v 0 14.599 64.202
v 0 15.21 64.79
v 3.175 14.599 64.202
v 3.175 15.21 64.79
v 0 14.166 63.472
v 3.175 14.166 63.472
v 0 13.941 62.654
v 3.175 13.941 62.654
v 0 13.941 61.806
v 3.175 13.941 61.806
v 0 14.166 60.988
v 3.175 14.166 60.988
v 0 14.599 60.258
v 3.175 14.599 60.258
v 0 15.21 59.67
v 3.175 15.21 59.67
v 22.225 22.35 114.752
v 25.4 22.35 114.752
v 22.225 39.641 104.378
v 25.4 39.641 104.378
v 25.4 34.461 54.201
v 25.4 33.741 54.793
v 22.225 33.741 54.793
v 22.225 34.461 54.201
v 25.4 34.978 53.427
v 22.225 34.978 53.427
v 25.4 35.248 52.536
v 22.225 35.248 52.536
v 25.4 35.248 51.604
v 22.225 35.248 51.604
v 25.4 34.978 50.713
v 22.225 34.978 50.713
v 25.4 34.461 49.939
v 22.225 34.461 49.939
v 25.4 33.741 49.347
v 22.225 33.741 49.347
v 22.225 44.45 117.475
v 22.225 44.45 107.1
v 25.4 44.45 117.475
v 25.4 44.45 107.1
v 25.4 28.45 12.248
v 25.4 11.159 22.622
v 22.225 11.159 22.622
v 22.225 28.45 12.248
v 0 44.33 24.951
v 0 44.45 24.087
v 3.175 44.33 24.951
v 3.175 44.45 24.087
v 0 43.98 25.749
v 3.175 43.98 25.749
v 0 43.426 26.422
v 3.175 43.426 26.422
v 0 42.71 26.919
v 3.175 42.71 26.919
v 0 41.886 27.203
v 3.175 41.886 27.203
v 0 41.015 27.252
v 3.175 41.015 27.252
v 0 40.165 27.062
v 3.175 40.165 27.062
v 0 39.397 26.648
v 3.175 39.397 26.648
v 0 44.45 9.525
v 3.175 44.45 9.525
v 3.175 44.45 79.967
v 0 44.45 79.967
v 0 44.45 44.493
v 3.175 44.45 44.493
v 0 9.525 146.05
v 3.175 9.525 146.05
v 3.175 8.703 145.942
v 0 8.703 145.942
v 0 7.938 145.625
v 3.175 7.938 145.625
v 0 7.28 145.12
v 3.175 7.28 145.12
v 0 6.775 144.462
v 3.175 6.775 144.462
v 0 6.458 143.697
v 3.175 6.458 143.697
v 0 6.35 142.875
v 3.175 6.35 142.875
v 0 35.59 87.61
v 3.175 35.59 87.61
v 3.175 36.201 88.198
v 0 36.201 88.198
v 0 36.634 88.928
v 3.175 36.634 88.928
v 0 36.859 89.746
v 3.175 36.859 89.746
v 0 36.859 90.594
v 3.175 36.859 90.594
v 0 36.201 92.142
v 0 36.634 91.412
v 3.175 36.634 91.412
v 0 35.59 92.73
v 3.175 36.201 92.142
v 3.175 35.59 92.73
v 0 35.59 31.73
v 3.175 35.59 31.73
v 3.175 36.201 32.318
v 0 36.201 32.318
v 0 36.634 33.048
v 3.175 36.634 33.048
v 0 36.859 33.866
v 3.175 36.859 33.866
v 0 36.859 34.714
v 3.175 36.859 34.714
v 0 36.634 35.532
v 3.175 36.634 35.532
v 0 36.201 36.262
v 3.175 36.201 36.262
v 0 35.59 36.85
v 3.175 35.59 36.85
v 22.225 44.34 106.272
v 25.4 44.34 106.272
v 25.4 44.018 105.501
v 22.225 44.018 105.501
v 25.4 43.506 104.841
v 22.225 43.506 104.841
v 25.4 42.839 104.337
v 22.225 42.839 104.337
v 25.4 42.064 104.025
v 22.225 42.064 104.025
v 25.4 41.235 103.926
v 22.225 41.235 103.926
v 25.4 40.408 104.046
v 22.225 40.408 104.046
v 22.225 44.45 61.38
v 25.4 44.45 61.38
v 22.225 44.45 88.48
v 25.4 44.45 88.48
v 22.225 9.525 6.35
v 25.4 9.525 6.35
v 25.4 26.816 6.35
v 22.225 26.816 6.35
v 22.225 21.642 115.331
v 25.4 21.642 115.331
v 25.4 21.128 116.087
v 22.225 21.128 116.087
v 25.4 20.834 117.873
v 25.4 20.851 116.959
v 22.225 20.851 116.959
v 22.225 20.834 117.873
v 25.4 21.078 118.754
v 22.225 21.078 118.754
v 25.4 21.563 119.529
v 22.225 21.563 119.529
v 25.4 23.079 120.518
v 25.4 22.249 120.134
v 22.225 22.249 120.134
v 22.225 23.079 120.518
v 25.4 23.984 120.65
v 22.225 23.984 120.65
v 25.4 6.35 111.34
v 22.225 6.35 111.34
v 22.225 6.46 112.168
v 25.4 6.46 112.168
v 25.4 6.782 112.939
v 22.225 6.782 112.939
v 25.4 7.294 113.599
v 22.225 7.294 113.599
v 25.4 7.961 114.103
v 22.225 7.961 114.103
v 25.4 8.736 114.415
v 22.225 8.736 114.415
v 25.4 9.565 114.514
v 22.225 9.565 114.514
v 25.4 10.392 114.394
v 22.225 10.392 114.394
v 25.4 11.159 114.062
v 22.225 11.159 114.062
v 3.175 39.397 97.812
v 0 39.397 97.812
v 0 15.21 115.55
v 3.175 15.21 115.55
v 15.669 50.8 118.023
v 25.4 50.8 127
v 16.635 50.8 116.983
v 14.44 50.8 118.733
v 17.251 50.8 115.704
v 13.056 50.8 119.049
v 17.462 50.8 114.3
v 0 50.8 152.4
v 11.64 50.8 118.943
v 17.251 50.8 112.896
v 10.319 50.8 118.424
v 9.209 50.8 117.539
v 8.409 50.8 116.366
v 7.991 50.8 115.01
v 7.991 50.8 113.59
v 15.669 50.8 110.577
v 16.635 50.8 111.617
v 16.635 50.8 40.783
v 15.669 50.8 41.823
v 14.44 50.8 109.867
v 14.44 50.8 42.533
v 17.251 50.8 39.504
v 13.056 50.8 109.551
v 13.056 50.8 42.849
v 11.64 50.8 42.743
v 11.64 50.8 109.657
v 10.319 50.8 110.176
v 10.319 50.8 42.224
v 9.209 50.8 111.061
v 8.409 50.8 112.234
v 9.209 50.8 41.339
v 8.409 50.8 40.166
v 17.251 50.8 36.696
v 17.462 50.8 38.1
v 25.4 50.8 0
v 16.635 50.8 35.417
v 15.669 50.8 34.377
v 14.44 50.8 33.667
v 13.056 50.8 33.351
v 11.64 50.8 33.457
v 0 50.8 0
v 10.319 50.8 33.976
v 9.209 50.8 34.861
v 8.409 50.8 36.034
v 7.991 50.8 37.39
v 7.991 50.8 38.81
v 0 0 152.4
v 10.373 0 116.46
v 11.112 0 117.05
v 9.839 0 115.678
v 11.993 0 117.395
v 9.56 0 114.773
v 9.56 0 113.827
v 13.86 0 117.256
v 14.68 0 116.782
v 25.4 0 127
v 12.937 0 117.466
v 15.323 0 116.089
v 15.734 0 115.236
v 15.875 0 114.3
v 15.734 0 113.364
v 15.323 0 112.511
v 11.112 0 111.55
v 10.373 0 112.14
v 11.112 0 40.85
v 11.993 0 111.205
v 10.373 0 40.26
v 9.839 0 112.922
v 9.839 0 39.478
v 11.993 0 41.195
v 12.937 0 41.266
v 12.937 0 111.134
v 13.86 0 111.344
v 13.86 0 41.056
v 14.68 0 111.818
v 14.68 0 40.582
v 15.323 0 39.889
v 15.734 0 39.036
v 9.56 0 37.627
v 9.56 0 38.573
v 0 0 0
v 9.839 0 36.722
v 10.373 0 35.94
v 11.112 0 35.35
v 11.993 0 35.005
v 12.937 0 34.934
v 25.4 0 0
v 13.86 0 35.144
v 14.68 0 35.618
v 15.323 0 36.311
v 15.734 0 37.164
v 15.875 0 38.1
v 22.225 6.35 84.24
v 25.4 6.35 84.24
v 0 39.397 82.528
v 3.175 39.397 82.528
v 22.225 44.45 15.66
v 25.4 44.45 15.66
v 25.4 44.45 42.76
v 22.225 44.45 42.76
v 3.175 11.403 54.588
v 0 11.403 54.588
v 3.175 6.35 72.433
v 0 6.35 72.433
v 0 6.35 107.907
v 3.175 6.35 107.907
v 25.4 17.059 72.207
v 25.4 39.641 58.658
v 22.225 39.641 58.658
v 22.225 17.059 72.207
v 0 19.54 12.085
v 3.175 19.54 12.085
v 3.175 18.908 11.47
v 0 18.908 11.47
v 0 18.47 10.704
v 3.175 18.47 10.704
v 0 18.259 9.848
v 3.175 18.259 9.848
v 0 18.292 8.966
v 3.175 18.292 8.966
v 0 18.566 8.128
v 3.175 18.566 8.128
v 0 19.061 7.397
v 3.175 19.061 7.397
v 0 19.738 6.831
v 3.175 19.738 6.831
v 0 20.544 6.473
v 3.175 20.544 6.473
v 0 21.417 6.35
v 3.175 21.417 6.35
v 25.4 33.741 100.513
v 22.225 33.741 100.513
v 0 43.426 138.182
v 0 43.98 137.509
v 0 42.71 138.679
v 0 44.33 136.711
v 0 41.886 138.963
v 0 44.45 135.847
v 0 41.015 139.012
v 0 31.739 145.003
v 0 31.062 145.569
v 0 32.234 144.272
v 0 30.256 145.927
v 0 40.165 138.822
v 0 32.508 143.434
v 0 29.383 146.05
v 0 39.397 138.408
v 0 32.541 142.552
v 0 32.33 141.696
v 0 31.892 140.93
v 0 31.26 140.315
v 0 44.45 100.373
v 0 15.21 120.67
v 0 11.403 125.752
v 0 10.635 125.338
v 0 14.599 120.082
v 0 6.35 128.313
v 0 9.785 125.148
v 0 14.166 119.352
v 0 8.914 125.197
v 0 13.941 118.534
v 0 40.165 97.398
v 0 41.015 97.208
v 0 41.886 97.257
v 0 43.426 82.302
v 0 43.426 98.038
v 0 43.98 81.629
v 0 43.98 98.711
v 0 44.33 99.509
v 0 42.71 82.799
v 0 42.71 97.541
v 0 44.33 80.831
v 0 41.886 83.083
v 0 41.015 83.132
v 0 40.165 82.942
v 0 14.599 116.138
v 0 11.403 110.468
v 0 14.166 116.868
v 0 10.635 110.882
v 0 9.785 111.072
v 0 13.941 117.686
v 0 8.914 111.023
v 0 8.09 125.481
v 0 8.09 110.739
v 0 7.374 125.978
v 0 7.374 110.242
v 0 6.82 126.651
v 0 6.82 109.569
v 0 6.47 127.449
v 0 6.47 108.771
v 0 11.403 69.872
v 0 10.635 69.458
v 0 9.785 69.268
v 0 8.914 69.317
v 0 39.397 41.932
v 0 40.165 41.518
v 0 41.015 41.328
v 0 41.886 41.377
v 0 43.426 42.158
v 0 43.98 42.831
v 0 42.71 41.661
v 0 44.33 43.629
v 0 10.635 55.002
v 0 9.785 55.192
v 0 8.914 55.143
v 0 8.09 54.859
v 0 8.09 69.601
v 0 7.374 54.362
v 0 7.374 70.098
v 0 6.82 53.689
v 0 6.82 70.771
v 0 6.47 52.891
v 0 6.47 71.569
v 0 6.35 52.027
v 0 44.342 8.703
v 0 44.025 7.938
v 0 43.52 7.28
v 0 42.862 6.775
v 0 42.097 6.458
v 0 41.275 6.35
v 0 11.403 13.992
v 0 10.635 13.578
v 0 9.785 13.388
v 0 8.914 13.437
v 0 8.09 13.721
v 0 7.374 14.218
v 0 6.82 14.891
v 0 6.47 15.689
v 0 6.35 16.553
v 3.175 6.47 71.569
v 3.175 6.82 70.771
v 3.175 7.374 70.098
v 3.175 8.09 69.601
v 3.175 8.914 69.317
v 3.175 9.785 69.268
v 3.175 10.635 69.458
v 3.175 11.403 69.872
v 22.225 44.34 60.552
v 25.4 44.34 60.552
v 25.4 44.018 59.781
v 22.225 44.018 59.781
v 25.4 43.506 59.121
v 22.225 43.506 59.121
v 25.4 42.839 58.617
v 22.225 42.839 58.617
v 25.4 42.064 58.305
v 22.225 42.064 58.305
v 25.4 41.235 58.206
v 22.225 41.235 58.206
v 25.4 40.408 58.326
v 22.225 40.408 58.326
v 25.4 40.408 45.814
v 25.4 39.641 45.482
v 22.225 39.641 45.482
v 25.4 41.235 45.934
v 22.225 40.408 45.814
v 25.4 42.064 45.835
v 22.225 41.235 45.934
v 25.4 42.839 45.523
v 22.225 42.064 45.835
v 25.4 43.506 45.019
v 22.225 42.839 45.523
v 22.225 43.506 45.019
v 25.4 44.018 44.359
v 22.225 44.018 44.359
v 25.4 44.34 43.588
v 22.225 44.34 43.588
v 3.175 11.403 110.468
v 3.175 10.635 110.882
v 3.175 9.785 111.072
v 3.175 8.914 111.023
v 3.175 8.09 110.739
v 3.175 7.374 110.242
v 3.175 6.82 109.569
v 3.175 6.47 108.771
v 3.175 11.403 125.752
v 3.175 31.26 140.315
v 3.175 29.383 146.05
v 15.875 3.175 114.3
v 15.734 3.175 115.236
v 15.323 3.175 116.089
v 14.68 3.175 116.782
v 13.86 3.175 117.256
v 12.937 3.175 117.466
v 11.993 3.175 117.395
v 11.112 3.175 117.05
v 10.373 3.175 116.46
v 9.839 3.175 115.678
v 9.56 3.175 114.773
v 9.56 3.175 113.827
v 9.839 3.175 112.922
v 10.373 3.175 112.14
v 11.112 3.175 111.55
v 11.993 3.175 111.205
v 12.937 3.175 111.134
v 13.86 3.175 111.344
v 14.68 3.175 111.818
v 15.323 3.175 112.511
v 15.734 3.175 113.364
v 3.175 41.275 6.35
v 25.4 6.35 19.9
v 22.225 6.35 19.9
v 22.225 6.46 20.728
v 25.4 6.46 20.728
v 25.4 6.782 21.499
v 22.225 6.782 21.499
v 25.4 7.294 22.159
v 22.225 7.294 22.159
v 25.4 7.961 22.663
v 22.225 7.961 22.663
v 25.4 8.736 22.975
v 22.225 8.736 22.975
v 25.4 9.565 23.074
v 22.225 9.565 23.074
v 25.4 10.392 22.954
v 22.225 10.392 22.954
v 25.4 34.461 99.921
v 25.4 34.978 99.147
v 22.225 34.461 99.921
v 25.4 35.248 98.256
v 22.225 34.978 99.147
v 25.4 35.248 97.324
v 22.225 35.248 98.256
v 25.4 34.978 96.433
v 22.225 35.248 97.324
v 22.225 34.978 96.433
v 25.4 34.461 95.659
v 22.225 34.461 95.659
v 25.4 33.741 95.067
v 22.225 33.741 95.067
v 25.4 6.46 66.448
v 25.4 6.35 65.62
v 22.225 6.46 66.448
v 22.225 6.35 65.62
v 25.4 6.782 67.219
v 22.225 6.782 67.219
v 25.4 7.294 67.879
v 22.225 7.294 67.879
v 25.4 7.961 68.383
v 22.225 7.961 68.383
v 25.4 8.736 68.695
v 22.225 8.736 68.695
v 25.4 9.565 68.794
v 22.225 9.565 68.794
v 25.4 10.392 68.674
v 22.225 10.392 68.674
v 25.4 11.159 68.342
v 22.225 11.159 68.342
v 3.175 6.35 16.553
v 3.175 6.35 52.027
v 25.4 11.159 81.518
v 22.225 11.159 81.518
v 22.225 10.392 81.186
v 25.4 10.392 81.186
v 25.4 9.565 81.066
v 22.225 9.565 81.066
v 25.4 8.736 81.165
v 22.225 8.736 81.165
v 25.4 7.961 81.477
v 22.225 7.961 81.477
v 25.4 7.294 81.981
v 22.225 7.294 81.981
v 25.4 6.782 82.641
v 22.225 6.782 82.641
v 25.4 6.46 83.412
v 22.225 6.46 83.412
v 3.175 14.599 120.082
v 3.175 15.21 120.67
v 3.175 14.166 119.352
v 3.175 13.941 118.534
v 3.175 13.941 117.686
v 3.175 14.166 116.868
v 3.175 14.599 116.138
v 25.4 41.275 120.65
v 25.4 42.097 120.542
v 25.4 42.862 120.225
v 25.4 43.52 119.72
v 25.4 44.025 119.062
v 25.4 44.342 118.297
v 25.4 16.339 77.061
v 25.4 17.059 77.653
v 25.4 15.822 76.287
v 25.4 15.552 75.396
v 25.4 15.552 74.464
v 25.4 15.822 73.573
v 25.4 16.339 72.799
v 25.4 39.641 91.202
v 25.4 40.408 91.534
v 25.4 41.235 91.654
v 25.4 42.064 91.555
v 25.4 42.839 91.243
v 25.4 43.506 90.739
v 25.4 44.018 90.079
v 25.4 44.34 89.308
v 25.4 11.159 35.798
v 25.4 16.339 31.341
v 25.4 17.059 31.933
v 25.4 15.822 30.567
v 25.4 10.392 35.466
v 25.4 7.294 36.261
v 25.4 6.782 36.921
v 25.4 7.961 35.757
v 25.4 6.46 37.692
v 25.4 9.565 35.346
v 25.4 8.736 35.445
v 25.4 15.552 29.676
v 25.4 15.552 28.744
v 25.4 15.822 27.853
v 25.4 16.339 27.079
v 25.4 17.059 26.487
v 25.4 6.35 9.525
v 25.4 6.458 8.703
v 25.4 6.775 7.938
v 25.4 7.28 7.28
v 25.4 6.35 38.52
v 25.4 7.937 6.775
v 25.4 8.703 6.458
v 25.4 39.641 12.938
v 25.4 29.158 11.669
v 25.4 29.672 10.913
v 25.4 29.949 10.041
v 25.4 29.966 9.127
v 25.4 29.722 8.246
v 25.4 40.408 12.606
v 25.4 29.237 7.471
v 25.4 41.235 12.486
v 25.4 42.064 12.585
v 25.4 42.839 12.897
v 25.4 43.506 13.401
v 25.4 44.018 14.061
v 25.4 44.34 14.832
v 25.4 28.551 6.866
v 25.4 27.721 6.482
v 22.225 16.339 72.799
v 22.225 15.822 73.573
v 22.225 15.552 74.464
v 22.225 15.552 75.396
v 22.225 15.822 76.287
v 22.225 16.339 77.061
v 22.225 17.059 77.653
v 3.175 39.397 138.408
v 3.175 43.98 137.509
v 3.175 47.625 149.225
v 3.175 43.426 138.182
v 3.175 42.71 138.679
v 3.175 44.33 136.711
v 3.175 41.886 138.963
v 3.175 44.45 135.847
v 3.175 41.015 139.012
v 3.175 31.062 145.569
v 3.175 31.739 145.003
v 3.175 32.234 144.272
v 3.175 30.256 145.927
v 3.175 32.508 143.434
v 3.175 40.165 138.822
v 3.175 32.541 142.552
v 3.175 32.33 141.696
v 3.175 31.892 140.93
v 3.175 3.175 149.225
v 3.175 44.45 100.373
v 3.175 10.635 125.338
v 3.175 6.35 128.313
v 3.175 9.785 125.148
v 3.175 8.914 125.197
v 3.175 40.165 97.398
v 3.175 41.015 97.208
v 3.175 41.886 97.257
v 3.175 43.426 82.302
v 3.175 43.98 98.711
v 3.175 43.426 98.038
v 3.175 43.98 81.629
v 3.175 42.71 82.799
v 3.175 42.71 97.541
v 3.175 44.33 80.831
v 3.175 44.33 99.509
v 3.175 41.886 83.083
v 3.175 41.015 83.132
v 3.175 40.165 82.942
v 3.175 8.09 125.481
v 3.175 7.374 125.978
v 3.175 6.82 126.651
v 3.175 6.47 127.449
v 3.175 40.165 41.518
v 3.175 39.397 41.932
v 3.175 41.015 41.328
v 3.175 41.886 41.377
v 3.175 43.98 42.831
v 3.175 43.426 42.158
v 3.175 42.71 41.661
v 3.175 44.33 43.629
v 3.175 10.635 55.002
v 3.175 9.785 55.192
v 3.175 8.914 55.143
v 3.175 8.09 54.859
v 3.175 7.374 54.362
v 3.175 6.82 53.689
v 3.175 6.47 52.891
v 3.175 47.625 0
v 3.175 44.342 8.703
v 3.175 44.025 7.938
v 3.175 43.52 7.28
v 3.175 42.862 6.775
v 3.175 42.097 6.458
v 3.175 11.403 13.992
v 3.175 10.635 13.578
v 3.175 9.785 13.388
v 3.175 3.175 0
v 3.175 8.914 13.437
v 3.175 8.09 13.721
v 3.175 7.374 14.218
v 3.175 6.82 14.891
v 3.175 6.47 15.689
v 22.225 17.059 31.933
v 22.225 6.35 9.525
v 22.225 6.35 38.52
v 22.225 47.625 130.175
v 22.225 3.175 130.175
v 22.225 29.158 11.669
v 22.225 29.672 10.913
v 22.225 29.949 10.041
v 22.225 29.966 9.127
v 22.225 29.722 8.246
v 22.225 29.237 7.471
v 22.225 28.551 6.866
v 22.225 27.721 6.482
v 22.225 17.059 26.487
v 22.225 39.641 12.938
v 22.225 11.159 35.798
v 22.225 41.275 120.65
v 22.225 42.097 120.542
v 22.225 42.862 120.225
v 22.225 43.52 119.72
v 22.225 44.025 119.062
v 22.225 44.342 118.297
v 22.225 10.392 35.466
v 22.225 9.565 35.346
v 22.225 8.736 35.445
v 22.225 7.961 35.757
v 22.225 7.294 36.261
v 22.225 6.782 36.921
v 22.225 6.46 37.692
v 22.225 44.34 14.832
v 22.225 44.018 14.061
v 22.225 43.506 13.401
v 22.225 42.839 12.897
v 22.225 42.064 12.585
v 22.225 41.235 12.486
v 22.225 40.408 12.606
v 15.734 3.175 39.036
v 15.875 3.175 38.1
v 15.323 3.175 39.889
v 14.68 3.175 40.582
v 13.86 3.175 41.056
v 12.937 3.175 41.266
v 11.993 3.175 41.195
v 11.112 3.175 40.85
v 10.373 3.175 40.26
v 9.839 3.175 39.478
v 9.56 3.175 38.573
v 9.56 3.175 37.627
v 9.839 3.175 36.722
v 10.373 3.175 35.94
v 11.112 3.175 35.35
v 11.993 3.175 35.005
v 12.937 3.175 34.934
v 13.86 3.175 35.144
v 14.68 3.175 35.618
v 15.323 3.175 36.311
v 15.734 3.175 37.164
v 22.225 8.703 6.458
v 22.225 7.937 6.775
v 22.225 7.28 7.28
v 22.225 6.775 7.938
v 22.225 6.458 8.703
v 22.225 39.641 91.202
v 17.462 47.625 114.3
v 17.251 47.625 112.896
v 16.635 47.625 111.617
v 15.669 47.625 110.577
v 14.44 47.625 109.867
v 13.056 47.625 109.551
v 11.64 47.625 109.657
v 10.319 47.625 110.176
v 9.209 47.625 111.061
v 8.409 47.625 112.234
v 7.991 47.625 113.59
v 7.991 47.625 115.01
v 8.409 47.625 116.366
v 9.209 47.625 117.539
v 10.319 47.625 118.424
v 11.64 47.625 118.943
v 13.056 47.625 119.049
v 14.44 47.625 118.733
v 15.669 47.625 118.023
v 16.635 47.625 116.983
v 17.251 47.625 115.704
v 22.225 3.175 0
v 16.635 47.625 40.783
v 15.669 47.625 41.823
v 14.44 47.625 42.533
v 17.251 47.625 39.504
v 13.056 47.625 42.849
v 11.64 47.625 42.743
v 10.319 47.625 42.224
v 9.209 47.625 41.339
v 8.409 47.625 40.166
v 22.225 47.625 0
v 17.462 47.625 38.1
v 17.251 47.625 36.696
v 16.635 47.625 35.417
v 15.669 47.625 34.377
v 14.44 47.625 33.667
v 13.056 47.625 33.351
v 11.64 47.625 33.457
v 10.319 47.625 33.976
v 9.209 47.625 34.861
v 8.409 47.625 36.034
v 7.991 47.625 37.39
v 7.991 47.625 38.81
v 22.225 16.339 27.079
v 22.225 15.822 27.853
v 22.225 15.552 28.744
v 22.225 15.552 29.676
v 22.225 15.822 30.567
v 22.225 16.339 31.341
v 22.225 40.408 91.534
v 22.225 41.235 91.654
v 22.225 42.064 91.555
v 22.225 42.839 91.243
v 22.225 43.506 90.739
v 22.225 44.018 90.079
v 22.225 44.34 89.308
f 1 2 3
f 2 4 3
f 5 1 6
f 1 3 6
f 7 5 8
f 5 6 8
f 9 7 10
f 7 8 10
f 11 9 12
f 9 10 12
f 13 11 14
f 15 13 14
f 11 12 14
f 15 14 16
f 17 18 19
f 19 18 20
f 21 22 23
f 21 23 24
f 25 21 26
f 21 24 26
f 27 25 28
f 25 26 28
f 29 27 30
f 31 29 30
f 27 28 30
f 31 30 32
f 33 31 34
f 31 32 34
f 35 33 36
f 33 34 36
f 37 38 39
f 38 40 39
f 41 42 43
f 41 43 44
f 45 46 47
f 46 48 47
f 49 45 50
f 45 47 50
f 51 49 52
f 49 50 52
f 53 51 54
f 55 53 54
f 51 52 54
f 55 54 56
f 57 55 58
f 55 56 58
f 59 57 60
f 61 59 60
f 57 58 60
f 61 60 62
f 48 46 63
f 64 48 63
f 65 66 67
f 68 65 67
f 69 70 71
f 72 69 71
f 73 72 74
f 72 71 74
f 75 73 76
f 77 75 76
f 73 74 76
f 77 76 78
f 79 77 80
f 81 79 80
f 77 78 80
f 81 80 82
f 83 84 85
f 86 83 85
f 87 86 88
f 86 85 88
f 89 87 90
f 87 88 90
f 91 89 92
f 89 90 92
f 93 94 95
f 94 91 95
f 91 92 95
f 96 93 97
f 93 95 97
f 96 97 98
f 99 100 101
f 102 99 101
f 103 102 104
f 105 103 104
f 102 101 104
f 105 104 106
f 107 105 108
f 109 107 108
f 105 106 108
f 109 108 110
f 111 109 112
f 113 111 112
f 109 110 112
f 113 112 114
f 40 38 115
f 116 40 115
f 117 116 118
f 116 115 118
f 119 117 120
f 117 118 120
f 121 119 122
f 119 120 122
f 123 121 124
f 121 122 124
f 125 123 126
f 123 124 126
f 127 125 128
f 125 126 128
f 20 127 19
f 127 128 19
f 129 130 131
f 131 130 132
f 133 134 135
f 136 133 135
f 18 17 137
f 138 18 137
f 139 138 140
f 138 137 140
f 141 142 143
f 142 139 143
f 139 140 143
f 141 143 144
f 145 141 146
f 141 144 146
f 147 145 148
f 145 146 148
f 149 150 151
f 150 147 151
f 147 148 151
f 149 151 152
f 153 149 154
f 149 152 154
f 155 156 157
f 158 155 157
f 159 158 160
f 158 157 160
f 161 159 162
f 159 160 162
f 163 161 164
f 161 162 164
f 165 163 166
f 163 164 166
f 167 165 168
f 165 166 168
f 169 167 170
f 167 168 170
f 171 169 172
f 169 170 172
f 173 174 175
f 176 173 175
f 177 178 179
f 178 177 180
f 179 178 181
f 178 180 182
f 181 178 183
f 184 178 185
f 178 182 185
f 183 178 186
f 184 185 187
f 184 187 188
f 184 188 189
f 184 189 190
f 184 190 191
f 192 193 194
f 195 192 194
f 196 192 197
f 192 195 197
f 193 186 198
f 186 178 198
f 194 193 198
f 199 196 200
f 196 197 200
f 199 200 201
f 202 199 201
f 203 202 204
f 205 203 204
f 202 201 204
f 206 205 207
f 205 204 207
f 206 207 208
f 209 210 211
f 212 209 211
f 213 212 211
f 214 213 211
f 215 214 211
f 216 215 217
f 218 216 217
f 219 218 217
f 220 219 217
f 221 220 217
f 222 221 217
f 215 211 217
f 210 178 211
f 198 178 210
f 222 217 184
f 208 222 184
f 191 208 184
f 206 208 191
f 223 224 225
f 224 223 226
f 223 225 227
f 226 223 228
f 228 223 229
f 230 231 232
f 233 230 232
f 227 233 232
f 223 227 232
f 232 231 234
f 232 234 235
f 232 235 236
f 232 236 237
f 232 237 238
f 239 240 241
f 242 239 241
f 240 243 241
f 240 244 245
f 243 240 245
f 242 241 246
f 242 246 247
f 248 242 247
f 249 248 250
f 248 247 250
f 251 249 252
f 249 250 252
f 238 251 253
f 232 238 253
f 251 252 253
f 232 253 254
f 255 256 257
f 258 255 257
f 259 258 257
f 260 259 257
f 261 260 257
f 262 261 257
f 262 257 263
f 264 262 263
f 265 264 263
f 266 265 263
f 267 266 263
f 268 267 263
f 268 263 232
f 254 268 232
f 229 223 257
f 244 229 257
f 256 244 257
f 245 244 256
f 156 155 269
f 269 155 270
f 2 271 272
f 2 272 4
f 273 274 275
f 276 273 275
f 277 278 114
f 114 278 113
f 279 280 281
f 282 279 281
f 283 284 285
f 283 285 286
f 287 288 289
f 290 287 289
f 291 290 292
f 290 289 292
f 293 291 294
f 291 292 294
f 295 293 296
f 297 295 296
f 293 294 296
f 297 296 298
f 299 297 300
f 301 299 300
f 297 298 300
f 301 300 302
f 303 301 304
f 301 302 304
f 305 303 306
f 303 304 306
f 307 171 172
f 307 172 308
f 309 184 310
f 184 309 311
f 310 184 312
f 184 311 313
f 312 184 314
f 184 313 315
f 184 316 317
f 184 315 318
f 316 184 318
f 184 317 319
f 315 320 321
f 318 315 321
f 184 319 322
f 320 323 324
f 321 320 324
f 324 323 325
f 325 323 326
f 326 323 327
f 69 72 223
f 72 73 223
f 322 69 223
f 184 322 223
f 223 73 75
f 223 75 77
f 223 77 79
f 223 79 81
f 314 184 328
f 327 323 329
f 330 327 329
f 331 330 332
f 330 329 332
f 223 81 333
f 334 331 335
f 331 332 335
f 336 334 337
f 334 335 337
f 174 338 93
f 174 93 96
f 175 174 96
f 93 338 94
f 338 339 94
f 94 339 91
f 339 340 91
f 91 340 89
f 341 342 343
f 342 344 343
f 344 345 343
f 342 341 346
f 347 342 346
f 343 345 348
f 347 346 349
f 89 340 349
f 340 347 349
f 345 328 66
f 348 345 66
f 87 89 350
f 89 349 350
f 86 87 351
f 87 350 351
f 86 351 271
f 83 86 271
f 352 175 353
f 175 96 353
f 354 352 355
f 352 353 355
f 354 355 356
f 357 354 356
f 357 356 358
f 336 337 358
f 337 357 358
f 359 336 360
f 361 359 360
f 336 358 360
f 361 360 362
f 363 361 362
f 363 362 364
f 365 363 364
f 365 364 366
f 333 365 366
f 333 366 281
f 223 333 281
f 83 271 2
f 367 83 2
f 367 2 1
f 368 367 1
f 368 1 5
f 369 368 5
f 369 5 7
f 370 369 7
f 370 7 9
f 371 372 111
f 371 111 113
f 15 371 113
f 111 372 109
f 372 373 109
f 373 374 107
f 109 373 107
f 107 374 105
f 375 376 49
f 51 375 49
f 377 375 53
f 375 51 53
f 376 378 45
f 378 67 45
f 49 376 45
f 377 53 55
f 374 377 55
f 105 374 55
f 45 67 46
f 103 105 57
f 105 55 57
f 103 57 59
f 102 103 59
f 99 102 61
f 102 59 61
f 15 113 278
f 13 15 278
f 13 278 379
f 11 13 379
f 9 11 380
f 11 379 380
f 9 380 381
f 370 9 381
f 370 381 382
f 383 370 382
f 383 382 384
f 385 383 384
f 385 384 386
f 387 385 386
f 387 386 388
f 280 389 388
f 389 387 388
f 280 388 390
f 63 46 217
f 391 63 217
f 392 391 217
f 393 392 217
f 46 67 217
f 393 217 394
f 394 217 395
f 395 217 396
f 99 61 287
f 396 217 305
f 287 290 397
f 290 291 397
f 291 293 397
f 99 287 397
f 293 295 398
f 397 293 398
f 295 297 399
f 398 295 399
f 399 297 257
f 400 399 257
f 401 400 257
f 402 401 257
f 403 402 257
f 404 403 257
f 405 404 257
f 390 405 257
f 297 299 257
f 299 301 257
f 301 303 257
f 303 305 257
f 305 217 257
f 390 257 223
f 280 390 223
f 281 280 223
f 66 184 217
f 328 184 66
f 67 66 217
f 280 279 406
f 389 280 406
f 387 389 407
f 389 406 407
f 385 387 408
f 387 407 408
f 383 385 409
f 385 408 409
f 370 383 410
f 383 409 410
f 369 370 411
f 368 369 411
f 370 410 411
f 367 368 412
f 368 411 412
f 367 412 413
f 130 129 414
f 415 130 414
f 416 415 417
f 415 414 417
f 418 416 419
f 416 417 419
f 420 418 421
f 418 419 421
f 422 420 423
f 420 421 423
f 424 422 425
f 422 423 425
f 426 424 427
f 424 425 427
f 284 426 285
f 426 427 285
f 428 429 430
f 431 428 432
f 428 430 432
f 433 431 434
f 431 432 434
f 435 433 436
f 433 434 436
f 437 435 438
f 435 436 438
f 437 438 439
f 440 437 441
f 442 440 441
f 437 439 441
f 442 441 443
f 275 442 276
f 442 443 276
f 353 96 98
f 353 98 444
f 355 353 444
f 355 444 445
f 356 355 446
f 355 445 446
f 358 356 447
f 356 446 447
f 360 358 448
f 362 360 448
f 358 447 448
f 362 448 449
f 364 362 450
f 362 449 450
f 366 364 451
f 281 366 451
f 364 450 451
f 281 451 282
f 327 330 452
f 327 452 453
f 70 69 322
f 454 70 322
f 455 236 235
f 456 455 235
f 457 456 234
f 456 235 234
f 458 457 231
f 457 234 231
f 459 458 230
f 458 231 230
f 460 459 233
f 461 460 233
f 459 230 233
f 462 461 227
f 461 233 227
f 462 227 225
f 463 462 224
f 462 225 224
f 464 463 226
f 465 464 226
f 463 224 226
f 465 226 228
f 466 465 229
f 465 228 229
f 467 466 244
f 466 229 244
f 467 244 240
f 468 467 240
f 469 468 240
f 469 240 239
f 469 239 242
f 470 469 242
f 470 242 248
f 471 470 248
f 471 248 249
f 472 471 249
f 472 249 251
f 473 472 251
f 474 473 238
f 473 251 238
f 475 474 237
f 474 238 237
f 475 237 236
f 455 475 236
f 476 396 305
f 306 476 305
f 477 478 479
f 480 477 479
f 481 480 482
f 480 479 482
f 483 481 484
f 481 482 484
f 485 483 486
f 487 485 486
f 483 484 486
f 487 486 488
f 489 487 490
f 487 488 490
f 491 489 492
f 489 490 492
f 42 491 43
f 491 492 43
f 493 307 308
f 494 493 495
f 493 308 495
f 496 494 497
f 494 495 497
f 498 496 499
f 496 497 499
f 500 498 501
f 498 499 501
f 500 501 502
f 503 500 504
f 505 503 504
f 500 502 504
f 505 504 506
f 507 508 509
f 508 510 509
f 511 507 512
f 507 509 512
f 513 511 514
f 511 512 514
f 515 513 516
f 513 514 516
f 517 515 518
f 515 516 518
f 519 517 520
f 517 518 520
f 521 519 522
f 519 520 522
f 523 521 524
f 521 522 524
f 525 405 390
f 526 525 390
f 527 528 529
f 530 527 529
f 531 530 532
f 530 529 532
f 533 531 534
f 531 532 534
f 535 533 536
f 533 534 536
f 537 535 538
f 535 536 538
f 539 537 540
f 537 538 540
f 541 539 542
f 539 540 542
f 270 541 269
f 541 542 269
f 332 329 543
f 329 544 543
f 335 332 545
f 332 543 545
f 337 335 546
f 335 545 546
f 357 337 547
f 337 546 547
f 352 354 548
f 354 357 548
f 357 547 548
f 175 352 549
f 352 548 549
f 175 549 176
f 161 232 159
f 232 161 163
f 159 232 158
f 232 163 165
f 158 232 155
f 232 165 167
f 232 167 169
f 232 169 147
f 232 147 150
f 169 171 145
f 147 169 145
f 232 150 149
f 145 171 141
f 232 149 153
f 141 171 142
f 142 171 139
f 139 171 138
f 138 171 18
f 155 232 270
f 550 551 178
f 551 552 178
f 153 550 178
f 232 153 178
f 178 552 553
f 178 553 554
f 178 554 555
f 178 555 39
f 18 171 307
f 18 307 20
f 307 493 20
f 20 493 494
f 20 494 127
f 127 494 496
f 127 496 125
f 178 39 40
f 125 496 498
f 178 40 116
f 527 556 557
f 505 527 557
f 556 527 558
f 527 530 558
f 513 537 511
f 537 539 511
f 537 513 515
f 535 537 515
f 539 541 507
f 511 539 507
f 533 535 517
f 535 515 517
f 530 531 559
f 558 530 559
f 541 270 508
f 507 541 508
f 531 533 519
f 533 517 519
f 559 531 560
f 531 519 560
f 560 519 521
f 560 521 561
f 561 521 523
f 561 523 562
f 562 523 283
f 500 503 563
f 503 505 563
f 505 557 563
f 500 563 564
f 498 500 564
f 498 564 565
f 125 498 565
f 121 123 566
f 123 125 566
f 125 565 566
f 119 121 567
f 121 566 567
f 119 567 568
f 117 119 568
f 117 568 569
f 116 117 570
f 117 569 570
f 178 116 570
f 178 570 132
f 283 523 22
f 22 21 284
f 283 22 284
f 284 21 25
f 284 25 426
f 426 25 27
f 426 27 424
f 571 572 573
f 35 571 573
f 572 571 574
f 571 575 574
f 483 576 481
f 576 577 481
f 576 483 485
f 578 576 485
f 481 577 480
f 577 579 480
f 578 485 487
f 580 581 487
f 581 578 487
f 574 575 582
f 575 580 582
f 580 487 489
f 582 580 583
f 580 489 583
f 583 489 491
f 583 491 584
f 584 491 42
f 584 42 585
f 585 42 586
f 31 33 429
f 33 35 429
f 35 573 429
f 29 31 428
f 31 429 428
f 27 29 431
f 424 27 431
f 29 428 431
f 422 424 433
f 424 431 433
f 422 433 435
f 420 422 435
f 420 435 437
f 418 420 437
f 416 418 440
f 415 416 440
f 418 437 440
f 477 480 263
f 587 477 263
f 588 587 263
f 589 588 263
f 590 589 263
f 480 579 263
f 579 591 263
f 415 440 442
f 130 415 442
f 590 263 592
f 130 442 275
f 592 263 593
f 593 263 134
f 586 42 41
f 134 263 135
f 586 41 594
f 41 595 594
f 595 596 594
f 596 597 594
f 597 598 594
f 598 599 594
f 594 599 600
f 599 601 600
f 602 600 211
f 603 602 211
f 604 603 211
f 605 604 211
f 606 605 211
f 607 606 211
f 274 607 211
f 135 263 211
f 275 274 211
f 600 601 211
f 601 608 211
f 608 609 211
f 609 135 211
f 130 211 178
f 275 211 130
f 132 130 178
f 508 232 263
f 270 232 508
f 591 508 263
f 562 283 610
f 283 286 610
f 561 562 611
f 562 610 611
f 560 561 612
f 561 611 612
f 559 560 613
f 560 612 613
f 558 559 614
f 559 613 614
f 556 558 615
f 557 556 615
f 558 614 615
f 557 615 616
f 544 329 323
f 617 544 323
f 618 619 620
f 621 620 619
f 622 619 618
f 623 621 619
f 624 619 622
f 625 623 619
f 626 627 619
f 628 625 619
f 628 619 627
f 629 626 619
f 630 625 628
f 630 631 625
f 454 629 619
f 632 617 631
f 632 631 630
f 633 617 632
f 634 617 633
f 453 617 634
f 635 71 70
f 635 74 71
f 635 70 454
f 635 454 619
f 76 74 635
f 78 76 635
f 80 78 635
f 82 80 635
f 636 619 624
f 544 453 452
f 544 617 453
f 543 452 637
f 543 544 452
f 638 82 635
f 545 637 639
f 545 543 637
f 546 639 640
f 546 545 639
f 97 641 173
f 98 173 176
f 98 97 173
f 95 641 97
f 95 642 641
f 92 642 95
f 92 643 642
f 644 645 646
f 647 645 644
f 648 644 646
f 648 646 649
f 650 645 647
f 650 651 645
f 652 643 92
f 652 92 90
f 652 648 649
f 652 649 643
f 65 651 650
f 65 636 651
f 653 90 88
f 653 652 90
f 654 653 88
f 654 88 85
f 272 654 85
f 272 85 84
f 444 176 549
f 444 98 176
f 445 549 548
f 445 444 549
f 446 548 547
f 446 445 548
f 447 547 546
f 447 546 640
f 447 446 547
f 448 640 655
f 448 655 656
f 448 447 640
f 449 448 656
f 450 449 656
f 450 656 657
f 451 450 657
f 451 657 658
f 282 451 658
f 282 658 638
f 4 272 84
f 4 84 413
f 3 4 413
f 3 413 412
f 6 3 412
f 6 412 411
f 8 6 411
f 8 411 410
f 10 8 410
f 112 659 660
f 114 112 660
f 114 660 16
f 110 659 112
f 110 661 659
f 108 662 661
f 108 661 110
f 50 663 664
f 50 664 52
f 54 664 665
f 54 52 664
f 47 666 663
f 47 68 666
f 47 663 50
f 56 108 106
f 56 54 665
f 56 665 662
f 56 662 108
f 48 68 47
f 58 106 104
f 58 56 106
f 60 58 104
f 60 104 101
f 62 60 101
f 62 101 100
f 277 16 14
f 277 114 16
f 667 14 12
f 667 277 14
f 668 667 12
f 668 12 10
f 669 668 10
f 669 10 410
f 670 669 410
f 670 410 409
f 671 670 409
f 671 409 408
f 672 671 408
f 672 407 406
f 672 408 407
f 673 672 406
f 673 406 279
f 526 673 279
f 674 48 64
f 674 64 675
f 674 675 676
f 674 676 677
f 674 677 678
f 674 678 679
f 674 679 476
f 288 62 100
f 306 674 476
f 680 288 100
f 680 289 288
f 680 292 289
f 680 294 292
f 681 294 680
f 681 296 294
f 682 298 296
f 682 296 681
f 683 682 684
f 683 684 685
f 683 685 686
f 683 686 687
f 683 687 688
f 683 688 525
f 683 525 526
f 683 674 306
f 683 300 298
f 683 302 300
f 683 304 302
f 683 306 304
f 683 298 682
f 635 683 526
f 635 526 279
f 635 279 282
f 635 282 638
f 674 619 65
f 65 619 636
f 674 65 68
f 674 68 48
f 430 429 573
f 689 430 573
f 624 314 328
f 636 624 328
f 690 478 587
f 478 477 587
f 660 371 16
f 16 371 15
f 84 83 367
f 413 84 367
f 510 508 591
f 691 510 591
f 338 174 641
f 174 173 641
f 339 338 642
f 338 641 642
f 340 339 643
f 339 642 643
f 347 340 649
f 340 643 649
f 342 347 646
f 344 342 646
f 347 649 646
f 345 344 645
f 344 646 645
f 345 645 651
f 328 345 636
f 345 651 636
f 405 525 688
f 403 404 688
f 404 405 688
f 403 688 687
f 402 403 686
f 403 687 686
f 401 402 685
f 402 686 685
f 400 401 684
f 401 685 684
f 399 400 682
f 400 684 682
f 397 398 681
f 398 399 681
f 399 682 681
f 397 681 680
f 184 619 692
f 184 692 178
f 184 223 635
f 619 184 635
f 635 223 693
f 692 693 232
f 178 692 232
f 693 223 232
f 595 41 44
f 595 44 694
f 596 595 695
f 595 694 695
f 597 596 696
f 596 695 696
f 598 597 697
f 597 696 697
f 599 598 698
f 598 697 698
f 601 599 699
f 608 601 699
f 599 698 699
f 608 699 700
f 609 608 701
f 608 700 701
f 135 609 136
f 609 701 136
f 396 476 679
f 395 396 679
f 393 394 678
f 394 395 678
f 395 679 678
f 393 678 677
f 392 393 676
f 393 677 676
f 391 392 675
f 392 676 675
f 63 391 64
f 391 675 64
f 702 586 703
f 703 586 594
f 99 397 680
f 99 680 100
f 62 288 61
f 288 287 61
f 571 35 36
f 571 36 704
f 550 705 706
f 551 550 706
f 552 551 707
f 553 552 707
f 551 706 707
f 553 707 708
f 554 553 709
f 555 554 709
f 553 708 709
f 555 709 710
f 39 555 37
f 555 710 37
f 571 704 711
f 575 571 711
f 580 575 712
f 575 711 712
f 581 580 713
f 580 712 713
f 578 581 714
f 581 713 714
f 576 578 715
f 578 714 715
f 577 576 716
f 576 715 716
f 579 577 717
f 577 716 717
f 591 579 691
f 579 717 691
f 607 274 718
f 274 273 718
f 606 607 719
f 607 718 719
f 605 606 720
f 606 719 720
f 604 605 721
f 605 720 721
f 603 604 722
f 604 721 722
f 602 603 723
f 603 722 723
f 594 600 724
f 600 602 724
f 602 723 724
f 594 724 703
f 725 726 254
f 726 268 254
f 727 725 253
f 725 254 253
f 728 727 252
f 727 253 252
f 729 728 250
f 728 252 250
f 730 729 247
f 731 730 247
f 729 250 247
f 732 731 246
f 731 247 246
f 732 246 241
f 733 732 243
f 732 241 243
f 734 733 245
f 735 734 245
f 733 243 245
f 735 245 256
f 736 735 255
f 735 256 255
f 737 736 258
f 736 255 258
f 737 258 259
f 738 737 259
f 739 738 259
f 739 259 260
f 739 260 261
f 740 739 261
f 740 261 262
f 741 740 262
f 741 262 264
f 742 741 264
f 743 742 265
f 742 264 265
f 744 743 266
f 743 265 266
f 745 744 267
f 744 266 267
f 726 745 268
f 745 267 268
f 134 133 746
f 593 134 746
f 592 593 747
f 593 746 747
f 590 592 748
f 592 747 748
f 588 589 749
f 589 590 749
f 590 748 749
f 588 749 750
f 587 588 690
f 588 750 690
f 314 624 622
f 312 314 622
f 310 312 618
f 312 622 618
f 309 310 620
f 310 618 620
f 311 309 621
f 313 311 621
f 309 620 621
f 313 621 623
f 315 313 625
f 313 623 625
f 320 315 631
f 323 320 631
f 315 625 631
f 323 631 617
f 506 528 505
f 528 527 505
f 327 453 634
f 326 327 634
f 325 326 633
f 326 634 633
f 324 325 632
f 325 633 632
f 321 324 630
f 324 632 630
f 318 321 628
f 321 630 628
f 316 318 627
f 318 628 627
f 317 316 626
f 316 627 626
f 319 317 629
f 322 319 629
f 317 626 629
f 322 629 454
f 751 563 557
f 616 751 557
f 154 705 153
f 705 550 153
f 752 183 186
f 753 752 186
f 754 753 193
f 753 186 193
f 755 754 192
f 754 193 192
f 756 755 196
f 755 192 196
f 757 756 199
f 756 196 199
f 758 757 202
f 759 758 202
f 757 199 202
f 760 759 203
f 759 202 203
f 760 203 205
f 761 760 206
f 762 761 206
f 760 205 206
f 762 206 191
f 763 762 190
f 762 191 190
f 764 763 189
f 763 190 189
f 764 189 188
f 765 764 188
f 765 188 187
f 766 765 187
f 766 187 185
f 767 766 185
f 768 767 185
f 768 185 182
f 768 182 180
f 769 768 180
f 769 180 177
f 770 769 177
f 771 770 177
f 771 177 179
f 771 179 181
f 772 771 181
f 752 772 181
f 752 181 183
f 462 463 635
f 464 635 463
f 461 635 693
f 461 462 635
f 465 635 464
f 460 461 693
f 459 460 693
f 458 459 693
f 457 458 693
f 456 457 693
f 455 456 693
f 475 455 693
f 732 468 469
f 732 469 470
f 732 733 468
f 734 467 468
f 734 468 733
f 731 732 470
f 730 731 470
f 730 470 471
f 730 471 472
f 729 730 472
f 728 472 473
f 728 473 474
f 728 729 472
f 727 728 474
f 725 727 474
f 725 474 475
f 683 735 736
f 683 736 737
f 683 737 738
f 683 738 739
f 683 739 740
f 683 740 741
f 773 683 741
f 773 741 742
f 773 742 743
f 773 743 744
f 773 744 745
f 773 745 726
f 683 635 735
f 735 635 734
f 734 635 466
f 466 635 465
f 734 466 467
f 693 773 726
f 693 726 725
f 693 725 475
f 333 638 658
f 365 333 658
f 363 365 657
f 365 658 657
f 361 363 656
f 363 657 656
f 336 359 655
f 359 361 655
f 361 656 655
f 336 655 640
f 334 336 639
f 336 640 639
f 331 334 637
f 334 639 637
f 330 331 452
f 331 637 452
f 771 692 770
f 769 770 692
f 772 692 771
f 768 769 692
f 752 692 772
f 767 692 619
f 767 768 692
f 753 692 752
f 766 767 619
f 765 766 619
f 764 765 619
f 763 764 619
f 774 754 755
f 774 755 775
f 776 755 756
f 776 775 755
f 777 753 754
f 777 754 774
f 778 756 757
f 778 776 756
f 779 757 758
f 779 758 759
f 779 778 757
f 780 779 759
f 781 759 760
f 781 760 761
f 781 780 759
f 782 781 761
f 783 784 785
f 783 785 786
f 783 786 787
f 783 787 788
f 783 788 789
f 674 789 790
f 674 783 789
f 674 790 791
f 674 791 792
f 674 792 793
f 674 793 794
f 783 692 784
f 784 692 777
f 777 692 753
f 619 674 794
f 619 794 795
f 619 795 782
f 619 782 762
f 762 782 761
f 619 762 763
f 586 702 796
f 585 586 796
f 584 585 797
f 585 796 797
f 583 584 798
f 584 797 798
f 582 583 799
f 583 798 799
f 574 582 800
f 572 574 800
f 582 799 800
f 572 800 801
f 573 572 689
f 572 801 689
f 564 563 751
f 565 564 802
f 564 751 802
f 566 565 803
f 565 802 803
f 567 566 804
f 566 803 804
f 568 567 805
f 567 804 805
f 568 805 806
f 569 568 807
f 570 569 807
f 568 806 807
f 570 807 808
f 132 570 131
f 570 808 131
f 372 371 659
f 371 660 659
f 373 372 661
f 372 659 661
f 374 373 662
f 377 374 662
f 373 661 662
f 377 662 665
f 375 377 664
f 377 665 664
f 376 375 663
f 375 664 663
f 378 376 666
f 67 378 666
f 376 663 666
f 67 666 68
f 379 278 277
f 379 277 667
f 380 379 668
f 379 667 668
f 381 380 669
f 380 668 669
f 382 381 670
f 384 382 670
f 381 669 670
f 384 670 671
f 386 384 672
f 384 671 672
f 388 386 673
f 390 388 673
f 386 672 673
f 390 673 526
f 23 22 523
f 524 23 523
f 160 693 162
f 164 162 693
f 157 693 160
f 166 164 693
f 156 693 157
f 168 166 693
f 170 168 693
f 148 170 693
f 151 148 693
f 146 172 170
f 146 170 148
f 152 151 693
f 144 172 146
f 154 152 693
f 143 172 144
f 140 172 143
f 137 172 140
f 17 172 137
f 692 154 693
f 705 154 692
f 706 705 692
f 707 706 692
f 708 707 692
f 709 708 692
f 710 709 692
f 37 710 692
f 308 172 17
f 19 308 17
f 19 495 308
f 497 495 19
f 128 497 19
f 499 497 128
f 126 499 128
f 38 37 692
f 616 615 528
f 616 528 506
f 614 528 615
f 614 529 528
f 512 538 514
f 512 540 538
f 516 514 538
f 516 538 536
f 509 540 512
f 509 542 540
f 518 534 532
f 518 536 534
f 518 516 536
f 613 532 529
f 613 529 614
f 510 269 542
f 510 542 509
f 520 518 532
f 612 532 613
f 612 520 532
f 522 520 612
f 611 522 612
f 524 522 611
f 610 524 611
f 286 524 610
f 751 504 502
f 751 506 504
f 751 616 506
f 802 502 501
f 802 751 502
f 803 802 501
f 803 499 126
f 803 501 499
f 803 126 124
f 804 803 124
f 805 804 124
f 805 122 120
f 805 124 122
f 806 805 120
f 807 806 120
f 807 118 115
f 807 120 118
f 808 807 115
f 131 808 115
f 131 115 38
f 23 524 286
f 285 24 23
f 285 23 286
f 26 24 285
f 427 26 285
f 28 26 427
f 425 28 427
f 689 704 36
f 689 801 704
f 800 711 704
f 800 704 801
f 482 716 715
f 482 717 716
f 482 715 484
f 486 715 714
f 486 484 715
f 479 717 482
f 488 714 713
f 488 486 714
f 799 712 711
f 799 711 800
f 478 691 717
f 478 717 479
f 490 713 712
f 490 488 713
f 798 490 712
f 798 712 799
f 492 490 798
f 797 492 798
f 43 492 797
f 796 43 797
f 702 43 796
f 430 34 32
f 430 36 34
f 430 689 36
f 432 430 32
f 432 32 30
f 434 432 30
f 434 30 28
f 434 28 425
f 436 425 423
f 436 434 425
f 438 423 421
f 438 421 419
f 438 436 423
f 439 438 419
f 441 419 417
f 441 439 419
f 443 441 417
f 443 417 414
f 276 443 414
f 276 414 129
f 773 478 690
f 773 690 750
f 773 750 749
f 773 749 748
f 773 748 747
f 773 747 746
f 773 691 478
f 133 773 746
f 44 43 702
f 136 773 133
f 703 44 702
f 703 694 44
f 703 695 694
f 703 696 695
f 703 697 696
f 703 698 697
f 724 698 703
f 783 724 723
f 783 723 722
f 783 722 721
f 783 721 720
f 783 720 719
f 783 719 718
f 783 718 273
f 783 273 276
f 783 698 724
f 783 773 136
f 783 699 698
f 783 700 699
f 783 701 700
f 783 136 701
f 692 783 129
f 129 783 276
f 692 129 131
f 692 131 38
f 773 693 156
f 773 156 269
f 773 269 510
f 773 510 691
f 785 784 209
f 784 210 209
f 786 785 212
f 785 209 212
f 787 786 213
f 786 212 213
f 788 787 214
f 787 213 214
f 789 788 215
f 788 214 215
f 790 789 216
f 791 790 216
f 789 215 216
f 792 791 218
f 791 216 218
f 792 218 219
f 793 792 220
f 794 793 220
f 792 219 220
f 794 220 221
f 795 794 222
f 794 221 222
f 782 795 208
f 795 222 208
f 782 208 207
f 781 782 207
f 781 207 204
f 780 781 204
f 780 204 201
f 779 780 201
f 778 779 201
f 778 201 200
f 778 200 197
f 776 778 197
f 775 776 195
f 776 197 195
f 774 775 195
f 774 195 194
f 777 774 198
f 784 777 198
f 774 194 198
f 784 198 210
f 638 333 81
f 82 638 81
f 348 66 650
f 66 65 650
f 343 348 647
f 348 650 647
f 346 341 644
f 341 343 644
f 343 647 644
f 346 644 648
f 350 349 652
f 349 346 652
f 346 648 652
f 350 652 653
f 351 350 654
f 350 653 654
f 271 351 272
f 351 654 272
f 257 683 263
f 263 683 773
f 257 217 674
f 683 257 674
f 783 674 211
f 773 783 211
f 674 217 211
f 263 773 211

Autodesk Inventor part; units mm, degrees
ref_plane "YZ Plane" through (0, 0, 0) normal (1, 0, 0) x (0, 1, 0)
ref_plane "XZ Plane" through (0, 0, 0) normal (0, 1, 0) x (-1, 0, 0)
ref_plane "XY Plane" through (0, 0, 0) normal (0, 0, 1) x (1, 0, 0)
sketch "Sketch1" plane through (0, 0, 0) normal (0, 0, 1) x (1, 0, 0)
  line L0 (0, 0) -> (25.4, 0)
  line L1 (25.4, 0) -> (25.4, 50.8)
  line L2 (25.4, 50.8) -> (0, 50.8)
  line L3 (0, 50.8) -> (0, 0)
  line L4 (3.175, 3.175) -> (22.225, 3.175)
  line L5 (22.225, 3.175) -> (22.225, 47.625)
  line L6 (22.225, 47.625) -> (3.175, 47.625)
  line L7 (3.175, 47.625) -> (3.175, 3.175)
  dimension "d0" = 50.8
  dimension "d1" = 25.4
  dimension "d2" = 3.175
  dimension "d3" = 3.175
  dimension "d4" = 3.175
  dimension "d5" = 3.175
extrude "Extrusion1" add sketch "Sketch1" along normal blind 152.4
sketch "Sketch2" plane through (0, 0, 0) normal (0, -1, 0) x (1, 0, 0)
  line L0 (25.4, 152.4) -> (0, 152.4) projected
  line L1 (0, 0) -> (0, 152.4) projected
  line L2 (25.4, 0) -> (25.4, 152.4) projected
  line L3 (0, 152.4) -> (25.4, 127)
  circle A0 centre (12.7, 114.3) radius 3.175
  circle A1 centre (12.7, 38.1) radius 3.175
  dimension "d8" = 45
  dimension "d9" = 6.35
  dimension "d10" = 12.7
  dimension "d11" = 38.1
  dimension "d12" = 76.2
extrude "Extrusion2" cut sketch "Sketch2" against normal blind 3.175 contours A0 | A1
extrude "Extrusion3" cut sketch "Sketch2" against normal through all contours L2 L3 L0
sketch "Sketch3" plane through (0, 50.8, 0) normal (0, 1, 0) x (1, 0, 0)
  circle A0 centre (12.7, -114.3) radius 3.175 projected
  circle A1 centre (12.7, -38.1) radius 3.175 projected
  circle A2 centre (12.7, -38.1) radius 4.7625
  circle A3 centre (12.7, -114.3) radius 4.7625
  dimension "d17" = 9.525
extrude "Extrusion4" cut sketch "Sketch3" against normal blind 3.175 contours A0 | A1 | A2 | A3
sketch "Sketch4" plane through (25.4, 0, 0) normal (1, 0, 0) x (0, 0, -1)
  line L0 (-127, 50.8) -> (-127, 0) projected
  line L1 (0, 0) -> (-127, 0) projected
  line L2 (0, 0) -> (0, 50.8) projected
  line L3 (0, 50.8) -> (-127, 50.8) projected
  line L4 (0, 50.8) -> (0, 0)
  line L5 (-127, 50.8) -> (0, 50.8)
  line L6 (-127, 0) -> (-127, 50.8)
  line L7 (-127, 0) -> (0, 0)
  line L8 (-55.7727, 44.45) -> (-74.93, 12.5211)
  line L9 (-74.93, 6.35) -> (-52.07, 44.45) construction
  line L10 (-120.65, 6.35) -> (-6.35, 6.35)
  line L11 (-6.35, 44.45) -> (-120.65, 44.45)
  line L12 (-52.07, 38.2789) -> (-71.2273, 6.35)
  line L13 (-52.07, 44.45) -> (-29.21, 6.35) construction
  line L14 (-48.3673, 44.45) -> (-29.21, 12.5211)
  line L15 (-94.0873, 44.45) -> (-74.93, 12.5211)
  line L16 (-97.79, 44.45) -> (-74.93, 6.35) construction
  line L17 (-78.6327, 6.35) -> (-97.79, 38.2789)
  line L18 (-52.07, 38.2789) -> (-32.9127, 6.35)
  line L19 (-116.9473, 6.35) -> (-97.79, 38.2789)
  line L20 (-120.65, 44.45) -> (-120.65, 6.35)
  line L21 (-120.65, 6.35) -> (-97.79, 44.45) construction
  line L22 (-120.65, 12.5211) -> (-101.4927, 44.45)
  line L23 (-29.21, 12.5211) -> (-10.0527, 44.45)
  line L24 (-25.5073, 6.35) -> (-6.35, 38.2789)
  line L25 (-6.35, 6.35) -> (-6.35, 44.45)
  line L26 (-29.21, 6.35) -> (-6.35, 44.45) construction
  dimension "d20" = 30.964
  dimension "d21" = 61.928
  dimension "d22" = 61.928
  dimension "d23" = 61.928
  dimension "d24" = 61.928
  dimension "d25" = 3.175
  dimension "d26" = 3.175
  dimension "d27" = 3.175
  dimension "d28" = 3.175
  dimension "d29" = 3.175
  dimension "d30" = 3.175
  dimension "d31" = 3.175
  dimension "d32" = 3.175
  dimension "d33" = 3.175
  dimension "d34" = 3.175
  dimension "d35" = 6.35
  dimension "d36" = 6.35
  dimension "d37" = 6.35
  dimension "d38" = 6.35
extrude "Extrusion5" cut sketch "Sketch4" against normal blind 3.175 contours L8 L15 L11 | L11 L23 L14 | L22 L20 L11 | L25 L10 L24 | L19 L17 L10 | L10 L12 L18
sketch "Sketch5" plane through (0, 0, 0) normal (-1, 0, 0) x (0, 0, 1)
  line L0 (152.4, 0) -> (152.4, 50.8) projected
  line L1 (0, 50.8) -> (152.4, 50.8) projected
  line L2 (0, 50.8) -> (0, 0) projected
  line L3 (0, 0) -> (152.4, 0) projected
  line L4 (0, 0) -> (0, 50.8)
  line L5 (152.4, 0) -> (0, 0)
  line L6 (152.4, 50.8) -> (152.4, 0)
  line L7 (152.4, 50.8) -> (0, 50.8)
  line L8 (90.17, 39.0811) -> (66.1672, 6.35)
  line L9 (86.2328, 44.45) -> (62.23, 11.7189)
  line L10 (62.23, 6.35) -> (90.17, 44.45) construction
  line L11 (6.35, 6.35) -> (146.05, 6.35)
  line L12 (146.05, 44.45) -> (6.35, 44.45)
  line L13 (90.17, 44.45) -> (118.11, 6.35) construction
  line L14 (90.17, 39.0811) -> (114.1728, 6.35)
  line L15 (118.11, 11.7189) -> (142.1128, 44.45)
  line L16 (118.11, 6.35) -> (146.05, 44.45) construction
  line L17 (146.05, 6.35) -> (146.05, 44.45)
  line L18 (122.0472, 6.35) -> (146.05, 39.0811)
  line L19 (94.1072, 44.45) -> (118.11, 11.7189)
  line L20 (38.2272, 44.45) -> (62.23, 11.7189)
  line L21 (34.29, 44.45) -> (62.23, 6.35) construction
  line L22 (10.2872, 6.35) -> (34.29, 39.0811)
  line L23 (6.35, 44.45) -> (6.35, 6.35)
  line L24 (6.35, 6.35) -> (34.29, 44.45) construction
  line L25 (6.35, 11.7189) -> (30.3528, 44.45)
  line L26 (58.2928, 6.35) -> (34.29, 39.0811)
  dimension "d41" = 36.254
  dimension "d42" = 72.508
  dimension "d43" = 72.508
  dimension "d44" = 72.508
  dimension "d45" = 72.508
  dimension "d46" = 3.175
  dimension "d47" = 3.175
  dimension "d48" = 3.175
  dimension "d49" = 3.175
  dimension "d50" = 3.175
  dimension "d51" = 3.175
  dimension "d52" = 3.175
  dimension "d53" = 3.175
  dimension "d54" = 3.175
  dimension "d55" = 3.175
  dimension "d56" = 6.35
  dimension "d57" = 6.35
  dimension "d58" = 6.35
  dimension "d59" = 6.35
extrude "Extrusion6" cut sketch "Sketch5" against normal blind 3.175 contours L14 L11 L8 | L11 L22 L26 | L18 L17 L11 | L23 L12 L25 | L15 L19 L12 | L12 L9 L20
fillet "Fillet1" radius 3.175 36 edges at (1.5875, 11.7189, 6.35) (1.5875, 44.45, 6.35) (1.5875, 44.45, 30.3528) (1.5875, 39.0811, 34.29) (1.5875, 6.35, 10.2872) (1.5875, 6.35, 58.2928) (1.5875, 44.45, 38.2272) (1.5875, 11.7189, 62.23) (1.5875, 44.45, 86.2328) (1.5875, 39.0811, 90.17) (1.5875, 6.35, 66.1672) (1.5875, 6.35, 114.1728) (1.5875, 44.45, 94.1072) (1.5875, 44.45, 142.1128) (1.5875, 11.7189, 118.11) (1.5875, 39.0811, 146.05) (1.5875, 6.35, 122.0472) (1.5875, 6.35, 146.05) (23.8125, 44.45, 120.65) (23.8125, 44.45, 101.4927) (23.8125, 12.5211, 120.65) (23.8125, 6.35, 116.9473) (23.8125, 38.2789, 97.79) (23.8125, 6.35, 78.6327) (23.8125, 12.5211, 74.93) (23.8125, 44.45, 94.0873) (23.8125, 44.45, 55.7727) (23.8125, 38.2789, 52.07) (23.8125, 6.35, 71.2273) (23.8125, 6.35, 32.9127) (23.8125, 12.5211, 29.21) (23.8125, 44.45, 48.3673) (23.8125, 44.45, 10.0527) (23.8125, 38.2789, 6.35) (23.8125, 6.35, 25.5073) (23.8125, 6.35, 6.35)
equation "\"d3\" = d2"
equation "\"d4\" = d3"
equation "\"d5\" = d4"
equation "\"d21\" = 2 * d20"
equation "\"d22\" = d21"
equation "\"d23\" = d22"
equation "\"d24\" = d23"
equation "\"d26\" = d25"
equation "\"d27\" = d26"
equation "\"d28\" = d27"
equation "\"d29\" = d28"
equation "\"d30\" = d29"
equation "\"d31\" = d30"
equation "\"d32\" = d30"
equation "\"d33\" = d32"
equation "\"d34\" = d33"
equation "\"d42\" = 2 * d41"
equation "\"d43\" = d42"
equation "\"d44\" = d43"
equation "\"d45\" = d44"
equation "\"d47\" = d46"
equation "\"d48\" = d47"
equation "\"d49\" = d48"
equation "\"d50\" = d49"
equation "\"d51\" = d50"
equation "\"d52\" = d51"
equation "\"d53\" = d51"
equation "\"d54\" = d53"
equation "\"d55\" = d54"
properties part number "5in 1by2 frame"
